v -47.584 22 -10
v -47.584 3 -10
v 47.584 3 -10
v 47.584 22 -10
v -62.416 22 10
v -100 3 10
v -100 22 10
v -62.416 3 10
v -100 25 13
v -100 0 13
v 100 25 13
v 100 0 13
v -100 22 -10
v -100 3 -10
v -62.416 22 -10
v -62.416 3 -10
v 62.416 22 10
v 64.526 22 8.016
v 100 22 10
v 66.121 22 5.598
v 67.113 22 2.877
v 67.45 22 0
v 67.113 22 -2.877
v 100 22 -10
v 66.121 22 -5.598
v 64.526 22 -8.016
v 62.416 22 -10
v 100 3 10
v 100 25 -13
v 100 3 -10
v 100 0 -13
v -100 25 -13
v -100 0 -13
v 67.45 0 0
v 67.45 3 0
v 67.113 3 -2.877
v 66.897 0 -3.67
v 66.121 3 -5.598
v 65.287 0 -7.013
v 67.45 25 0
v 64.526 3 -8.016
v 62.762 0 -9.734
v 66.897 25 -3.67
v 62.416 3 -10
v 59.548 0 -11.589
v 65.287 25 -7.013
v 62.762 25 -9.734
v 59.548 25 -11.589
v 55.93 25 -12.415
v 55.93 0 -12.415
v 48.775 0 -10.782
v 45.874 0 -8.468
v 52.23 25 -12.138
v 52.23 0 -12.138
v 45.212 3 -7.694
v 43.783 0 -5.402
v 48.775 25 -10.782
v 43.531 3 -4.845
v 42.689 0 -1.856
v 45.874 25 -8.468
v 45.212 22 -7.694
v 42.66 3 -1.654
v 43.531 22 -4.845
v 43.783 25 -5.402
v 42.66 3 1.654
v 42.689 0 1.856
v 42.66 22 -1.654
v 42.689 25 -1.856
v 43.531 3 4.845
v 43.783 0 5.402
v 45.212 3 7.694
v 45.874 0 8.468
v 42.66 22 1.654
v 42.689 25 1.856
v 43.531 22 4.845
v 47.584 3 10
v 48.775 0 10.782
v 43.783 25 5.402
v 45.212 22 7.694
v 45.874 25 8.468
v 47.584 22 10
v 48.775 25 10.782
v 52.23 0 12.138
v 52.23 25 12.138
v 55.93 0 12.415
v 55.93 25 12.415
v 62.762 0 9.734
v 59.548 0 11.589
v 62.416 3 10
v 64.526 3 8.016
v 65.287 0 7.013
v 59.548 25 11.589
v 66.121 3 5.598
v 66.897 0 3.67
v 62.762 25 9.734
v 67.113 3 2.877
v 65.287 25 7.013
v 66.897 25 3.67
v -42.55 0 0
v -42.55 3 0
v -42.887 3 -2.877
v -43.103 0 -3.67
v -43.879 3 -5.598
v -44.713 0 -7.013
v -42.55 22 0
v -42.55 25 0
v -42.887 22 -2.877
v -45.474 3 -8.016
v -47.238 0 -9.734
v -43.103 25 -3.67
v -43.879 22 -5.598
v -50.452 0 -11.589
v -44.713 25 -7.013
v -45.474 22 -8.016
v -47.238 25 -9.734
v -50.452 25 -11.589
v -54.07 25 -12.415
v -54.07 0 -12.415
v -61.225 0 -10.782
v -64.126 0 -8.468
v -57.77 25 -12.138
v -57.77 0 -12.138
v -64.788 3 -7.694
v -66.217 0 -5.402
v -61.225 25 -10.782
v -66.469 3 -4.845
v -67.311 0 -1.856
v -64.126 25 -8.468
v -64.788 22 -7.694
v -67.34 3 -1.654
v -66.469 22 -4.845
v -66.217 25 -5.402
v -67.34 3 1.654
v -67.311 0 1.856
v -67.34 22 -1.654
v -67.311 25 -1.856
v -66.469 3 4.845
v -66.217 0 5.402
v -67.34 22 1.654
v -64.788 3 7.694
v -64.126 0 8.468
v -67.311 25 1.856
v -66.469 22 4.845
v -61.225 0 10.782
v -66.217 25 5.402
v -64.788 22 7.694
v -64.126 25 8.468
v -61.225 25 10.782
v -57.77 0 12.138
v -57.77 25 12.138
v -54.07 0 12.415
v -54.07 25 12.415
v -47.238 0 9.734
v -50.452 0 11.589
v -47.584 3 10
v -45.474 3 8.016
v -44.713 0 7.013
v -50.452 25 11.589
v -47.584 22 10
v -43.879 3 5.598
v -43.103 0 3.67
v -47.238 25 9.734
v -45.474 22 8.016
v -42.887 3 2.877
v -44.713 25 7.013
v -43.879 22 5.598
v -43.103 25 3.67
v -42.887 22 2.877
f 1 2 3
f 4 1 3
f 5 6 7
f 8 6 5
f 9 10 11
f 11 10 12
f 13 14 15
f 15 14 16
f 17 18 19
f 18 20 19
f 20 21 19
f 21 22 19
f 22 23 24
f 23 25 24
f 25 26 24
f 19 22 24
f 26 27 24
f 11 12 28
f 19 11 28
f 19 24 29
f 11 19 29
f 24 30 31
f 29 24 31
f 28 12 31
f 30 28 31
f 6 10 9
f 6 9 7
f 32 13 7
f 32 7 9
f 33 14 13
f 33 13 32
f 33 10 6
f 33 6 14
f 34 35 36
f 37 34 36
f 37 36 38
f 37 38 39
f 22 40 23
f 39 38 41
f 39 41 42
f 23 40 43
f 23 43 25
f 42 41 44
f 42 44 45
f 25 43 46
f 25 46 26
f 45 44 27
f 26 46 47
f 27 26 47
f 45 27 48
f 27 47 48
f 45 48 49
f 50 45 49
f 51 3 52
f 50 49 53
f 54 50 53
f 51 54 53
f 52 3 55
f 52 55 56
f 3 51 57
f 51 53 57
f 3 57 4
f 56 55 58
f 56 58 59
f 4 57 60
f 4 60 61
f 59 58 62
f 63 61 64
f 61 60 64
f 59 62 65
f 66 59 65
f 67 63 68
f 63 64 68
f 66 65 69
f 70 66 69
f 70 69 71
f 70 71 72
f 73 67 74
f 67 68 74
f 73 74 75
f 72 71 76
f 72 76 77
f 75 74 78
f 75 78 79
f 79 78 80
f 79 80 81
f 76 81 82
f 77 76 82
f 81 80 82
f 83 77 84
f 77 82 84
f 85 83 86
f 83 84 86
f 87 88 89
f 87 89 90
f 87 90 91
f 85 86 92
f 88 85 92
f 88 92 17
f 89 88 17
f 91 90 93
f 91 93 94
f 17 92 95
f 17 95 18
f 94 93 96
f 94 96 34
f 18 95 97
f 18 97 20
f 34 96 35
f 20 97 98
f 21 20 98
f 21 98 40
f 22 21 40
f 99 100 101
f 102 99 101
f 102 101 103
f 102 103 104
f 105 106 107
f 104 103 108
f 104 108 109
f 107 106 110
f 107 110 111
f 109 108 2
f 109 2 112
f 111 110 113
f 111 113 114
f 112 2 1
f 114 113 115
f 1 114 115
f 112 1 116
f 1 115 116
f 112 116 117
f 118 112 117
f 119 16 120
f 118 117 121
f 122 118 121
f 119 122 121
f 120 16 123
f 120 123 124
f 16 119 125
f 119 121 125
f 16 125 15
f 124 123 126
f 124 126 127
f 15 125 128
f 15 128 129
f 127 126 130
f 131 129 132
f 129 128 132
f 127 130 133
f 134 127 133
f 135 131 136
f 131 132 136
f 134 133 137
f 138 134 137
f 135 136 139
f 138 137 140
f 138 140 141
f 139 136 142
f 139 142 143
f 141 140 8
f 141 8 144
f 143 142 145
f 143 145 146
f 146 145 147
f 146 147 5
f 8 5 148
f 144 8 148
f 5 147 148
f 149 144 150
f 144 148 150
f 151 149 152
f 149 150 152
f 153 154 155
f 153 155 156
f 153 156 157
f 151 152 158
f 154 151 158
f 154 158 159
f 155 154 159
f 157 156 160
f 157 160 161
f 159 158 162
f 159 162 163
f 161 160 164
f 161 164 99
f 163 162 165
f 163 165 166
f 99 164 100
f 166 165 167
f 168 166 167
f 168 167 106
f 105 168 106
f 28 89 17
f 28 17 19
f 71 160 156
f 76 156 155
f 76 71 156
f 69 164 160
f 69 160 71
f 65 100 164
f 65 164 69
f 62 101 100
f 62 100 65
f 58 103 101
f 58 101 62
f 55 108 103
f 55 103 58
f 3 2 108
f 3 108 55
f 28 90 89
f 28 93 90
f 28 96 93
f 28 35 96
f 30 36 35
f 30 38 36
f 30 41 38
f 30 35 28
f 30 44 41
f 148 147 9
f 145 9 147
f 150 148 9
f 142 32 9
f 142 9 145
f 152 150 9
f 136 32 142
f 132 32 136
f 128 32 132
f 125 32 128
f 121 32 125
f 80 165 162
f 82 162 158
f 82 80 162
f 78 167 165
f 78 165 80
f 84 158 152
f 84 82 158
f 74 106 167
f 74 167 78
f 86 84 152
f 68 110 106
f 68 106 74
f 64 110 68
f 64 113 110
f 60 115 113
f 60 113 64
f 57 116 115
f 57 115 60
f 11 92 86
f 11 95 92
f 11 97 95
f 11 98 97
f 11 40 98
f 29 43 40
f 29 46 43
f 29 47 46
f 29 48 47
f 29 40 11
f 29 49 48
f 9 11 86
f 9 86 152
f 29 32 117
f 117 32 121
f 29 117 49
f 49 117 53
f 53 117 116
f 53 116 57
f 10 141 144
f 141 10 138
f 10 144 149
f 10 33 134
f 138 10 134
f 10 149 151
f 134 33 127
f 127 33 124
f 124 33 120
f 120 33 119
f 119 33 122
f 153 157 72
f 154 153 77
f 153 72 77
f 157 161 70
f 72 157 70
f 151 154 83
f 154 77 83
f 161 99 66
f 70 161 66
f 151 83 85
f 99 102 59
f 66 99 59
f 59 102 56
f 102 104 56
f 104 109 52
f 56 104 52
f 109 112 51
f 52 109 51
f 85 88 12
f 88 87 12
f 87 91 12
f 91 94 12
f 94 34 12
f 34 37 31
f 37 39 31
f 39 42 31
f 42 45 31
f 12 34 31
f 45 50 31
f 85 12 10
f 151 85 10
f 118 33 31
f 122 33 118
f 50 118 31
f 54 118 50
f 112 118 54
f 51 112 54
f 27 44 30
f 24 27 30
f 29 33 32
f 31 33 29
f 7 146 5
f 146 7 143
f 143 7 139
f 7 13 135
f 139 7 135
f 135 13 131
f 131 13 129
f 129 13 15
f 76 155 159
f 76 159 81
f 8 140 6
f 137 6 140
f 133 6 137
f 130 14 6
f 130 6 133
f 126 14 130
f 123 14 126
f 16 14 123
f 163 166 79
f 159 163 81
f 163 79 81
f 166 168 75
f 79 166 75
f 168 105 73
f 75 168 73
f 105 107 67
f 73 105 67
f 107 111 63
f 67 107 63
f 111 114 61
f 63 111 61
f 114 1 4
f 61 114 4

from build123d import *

# Parameters (mm, degrees)
SKETCH1_W           = 200
SKETCH1_H           = 26
BOSS_EXTRUDE1_DEPTH = 25
SHELL1_T            = -3
SKETCH2_R           = 12.45
CUT_EXTRUDE1_DEPTH  = 25


with BuildPart() as part:
    # Sketch1 → Boss-Extrude1 (new body)
    with BuildSketch(Plane(origin=(0, 0, 0), x_dir=(1, 0, 0), z_dir=(0, 1, 0))):
        Rectangle(SKETCH1_W, SKETCH1_H)
    extrude(amount=BOSS_EXTRUDE1_DEPTH)

    # Shell1
    shell1_openings = [part.faces().sort_by_distance(p)[0] for p in [
        (100, 12.5, 0),
        (-100, 12.5, 0),
    ]]
    offset(amount=SHELL1_T, openings=shell1_openings, kind=Kind.INTERSECTION)

    # Sketch2 → Cut-Extrude1 (cut)
    with BuildSketch(Plane(origin=(0, 25, 0), x_dir=(1, 0, 0), z_dir=(0, 1, 0))):
        with Locations((-55, 0)):
            Circle(SKETCH2_R)
        with Locations((55, 0)):
            Circle(SKETCH2_R)
    extrude(amount=-CUT_EXTRUDE1_DEPTH, mode=Mode.SUBTRACT)


solid = part.part
